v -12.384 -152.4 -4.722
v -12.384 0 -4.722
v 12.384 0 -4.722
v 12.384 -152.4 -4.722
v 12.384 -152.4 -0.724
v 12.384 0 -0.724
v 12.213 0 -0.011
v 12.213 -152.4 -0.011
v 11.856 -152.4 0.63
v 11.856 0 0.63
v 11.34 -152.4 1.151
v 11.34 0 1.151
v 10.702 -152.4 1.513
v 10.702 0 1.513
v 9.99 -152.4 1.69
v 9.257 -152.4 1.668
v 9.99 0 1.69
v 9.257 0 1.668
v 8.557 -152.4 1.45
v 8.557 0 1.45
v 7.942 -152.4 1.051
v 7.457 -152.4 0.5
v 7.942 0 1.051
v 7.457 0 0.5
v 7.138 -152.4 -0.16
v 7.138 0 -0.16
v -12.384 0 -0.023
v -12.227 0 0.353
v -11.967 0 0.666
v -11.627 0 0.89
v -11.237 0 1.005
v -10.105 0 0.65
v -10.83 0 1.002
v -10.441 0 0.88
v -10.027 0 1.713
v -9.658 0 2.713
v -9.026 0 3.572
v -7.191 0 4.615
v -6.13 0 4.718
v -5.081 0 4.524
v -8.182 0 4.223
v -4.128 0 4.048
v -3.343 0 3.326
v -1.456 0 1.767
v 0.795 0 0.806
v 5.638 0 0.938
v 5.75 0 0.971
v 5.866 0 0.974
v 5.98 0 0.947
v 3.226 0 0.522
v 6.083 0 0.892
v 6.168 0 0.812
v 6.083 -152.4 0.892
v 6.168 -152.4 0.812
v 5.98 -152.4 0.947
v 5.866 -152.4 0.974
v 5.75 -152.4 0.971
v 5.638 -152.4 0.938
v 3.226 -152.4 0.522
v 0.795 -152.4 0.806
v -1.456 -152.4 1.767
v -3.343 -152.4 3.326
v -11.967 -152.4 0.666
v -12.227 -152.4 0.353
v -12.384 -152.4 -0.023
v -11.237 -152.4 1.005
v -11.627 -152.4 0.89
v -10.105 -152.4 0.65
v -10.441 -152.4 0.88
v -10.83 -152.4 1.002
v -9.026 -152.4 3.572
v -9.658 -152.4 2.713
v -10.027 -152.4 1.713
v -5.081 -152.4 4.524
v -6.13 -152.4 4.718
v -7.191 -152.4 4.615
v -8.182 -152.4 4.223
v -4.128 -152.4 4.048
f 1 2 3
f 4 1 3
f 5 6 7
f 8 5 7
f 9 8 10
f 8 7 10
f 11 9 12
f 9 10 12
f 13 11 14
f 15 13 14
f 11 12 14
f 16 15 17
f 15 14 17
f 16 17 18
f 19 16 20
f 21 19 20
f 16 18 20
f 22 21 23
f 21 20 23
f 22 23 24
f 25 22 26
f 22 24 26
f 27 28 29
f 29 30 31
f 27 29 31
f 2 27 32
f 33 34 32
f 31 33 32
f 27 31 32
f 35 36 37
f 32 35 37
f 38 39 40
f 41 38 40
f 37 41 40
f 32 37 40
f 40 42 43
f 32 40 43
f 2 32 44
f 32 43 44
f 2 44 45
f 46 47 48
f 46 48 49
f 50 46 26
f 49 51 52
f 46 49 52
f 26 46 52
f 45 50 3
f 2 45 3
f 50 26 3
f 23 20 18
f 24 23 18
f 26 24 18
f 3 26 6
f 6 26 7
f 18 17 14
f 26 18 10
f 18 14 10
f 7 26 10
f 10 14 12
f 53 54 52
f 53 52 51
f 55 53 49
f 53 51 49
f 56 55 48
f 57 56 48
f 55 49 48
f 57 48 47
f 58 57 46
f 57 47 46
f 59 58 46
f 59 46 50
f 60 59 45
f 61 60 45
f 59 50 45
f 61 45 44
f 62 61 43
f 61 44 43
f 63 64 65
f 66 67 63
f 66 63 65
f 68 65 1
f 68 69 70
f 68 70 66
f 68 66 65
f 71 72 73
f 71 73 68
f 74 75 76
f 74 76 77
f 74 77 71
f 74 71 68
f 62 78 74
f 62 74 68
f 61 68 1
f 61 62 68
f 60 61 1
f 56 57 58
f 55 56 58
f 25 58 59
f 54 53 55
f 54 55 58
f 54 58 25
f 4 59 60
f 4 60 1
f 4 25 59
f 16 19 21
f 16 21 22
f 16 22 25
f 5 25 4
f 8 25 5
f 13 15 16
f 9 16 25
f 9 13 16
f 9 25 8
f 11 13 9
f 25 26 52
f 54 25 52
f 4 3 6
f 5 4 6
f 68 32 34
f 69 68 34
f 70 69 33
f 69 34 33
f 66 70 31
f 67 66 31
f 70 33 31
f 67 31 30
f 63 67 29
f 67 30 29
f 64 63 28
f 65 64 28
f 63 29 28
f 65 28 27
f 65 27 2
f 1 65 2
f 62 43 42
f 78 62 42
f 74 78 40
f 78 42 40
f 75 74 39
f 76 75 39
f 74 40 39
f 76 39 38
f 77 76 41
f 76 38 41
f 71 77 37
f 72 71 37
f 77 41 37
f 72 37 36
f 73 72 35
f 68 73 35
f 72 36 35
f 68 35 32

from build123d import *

# Parameters (mm, degrees)
F1_DEPTH = 152.4


# Not quite as in the source:
# - ends of sketch curves that miss each other by under 0.0002 mm in the source are joined


with BuildPart() as f1:
    # F0 (on Front) → F1 (new body)
    with BuildSketch(Plane.XZ):
        with BuildLine():
            Line((-12.3838716, -0.0228854), (-12.3838716, -4.7218854))
            Line((-12.3838716, -4.7218854), (12.383897, -4.7218854))
            Line((12.383897, -4.7218854), (12.383897, -0.7239254))
            ThreePointArc((12.383897, -0.7239254), (9.9901302454, 1.6896267796), (7.1382289827, -0.1602538356))
            Line((7.1382289827, -0.1602538356), (6.1675772, 0.81153))
            ThreePointArc((6.1675772, 0.81153), (5.9240303947, 0.9642906727), (5.6377868977, 0.9375583076))
            ThreePointArc((5.6377868977, 0.9375583076), (0.7948702497, 0.8064034512), (-3.3428712434, 3.3263562022))
            ThreePointArc((-3.3428712434, 3.3263562022), (-7.7001712998, 4.4538085328), (-10.1053789302, 0.6495786484))
            ThreePointArc((-10.1053789302, 0.6495786484), (-11.4361565644, 0.9623164645), (-12.3838716, -0.0228854))
        make_face()
    extrude(amount=F1_DEPTH)


solid = f1.part
